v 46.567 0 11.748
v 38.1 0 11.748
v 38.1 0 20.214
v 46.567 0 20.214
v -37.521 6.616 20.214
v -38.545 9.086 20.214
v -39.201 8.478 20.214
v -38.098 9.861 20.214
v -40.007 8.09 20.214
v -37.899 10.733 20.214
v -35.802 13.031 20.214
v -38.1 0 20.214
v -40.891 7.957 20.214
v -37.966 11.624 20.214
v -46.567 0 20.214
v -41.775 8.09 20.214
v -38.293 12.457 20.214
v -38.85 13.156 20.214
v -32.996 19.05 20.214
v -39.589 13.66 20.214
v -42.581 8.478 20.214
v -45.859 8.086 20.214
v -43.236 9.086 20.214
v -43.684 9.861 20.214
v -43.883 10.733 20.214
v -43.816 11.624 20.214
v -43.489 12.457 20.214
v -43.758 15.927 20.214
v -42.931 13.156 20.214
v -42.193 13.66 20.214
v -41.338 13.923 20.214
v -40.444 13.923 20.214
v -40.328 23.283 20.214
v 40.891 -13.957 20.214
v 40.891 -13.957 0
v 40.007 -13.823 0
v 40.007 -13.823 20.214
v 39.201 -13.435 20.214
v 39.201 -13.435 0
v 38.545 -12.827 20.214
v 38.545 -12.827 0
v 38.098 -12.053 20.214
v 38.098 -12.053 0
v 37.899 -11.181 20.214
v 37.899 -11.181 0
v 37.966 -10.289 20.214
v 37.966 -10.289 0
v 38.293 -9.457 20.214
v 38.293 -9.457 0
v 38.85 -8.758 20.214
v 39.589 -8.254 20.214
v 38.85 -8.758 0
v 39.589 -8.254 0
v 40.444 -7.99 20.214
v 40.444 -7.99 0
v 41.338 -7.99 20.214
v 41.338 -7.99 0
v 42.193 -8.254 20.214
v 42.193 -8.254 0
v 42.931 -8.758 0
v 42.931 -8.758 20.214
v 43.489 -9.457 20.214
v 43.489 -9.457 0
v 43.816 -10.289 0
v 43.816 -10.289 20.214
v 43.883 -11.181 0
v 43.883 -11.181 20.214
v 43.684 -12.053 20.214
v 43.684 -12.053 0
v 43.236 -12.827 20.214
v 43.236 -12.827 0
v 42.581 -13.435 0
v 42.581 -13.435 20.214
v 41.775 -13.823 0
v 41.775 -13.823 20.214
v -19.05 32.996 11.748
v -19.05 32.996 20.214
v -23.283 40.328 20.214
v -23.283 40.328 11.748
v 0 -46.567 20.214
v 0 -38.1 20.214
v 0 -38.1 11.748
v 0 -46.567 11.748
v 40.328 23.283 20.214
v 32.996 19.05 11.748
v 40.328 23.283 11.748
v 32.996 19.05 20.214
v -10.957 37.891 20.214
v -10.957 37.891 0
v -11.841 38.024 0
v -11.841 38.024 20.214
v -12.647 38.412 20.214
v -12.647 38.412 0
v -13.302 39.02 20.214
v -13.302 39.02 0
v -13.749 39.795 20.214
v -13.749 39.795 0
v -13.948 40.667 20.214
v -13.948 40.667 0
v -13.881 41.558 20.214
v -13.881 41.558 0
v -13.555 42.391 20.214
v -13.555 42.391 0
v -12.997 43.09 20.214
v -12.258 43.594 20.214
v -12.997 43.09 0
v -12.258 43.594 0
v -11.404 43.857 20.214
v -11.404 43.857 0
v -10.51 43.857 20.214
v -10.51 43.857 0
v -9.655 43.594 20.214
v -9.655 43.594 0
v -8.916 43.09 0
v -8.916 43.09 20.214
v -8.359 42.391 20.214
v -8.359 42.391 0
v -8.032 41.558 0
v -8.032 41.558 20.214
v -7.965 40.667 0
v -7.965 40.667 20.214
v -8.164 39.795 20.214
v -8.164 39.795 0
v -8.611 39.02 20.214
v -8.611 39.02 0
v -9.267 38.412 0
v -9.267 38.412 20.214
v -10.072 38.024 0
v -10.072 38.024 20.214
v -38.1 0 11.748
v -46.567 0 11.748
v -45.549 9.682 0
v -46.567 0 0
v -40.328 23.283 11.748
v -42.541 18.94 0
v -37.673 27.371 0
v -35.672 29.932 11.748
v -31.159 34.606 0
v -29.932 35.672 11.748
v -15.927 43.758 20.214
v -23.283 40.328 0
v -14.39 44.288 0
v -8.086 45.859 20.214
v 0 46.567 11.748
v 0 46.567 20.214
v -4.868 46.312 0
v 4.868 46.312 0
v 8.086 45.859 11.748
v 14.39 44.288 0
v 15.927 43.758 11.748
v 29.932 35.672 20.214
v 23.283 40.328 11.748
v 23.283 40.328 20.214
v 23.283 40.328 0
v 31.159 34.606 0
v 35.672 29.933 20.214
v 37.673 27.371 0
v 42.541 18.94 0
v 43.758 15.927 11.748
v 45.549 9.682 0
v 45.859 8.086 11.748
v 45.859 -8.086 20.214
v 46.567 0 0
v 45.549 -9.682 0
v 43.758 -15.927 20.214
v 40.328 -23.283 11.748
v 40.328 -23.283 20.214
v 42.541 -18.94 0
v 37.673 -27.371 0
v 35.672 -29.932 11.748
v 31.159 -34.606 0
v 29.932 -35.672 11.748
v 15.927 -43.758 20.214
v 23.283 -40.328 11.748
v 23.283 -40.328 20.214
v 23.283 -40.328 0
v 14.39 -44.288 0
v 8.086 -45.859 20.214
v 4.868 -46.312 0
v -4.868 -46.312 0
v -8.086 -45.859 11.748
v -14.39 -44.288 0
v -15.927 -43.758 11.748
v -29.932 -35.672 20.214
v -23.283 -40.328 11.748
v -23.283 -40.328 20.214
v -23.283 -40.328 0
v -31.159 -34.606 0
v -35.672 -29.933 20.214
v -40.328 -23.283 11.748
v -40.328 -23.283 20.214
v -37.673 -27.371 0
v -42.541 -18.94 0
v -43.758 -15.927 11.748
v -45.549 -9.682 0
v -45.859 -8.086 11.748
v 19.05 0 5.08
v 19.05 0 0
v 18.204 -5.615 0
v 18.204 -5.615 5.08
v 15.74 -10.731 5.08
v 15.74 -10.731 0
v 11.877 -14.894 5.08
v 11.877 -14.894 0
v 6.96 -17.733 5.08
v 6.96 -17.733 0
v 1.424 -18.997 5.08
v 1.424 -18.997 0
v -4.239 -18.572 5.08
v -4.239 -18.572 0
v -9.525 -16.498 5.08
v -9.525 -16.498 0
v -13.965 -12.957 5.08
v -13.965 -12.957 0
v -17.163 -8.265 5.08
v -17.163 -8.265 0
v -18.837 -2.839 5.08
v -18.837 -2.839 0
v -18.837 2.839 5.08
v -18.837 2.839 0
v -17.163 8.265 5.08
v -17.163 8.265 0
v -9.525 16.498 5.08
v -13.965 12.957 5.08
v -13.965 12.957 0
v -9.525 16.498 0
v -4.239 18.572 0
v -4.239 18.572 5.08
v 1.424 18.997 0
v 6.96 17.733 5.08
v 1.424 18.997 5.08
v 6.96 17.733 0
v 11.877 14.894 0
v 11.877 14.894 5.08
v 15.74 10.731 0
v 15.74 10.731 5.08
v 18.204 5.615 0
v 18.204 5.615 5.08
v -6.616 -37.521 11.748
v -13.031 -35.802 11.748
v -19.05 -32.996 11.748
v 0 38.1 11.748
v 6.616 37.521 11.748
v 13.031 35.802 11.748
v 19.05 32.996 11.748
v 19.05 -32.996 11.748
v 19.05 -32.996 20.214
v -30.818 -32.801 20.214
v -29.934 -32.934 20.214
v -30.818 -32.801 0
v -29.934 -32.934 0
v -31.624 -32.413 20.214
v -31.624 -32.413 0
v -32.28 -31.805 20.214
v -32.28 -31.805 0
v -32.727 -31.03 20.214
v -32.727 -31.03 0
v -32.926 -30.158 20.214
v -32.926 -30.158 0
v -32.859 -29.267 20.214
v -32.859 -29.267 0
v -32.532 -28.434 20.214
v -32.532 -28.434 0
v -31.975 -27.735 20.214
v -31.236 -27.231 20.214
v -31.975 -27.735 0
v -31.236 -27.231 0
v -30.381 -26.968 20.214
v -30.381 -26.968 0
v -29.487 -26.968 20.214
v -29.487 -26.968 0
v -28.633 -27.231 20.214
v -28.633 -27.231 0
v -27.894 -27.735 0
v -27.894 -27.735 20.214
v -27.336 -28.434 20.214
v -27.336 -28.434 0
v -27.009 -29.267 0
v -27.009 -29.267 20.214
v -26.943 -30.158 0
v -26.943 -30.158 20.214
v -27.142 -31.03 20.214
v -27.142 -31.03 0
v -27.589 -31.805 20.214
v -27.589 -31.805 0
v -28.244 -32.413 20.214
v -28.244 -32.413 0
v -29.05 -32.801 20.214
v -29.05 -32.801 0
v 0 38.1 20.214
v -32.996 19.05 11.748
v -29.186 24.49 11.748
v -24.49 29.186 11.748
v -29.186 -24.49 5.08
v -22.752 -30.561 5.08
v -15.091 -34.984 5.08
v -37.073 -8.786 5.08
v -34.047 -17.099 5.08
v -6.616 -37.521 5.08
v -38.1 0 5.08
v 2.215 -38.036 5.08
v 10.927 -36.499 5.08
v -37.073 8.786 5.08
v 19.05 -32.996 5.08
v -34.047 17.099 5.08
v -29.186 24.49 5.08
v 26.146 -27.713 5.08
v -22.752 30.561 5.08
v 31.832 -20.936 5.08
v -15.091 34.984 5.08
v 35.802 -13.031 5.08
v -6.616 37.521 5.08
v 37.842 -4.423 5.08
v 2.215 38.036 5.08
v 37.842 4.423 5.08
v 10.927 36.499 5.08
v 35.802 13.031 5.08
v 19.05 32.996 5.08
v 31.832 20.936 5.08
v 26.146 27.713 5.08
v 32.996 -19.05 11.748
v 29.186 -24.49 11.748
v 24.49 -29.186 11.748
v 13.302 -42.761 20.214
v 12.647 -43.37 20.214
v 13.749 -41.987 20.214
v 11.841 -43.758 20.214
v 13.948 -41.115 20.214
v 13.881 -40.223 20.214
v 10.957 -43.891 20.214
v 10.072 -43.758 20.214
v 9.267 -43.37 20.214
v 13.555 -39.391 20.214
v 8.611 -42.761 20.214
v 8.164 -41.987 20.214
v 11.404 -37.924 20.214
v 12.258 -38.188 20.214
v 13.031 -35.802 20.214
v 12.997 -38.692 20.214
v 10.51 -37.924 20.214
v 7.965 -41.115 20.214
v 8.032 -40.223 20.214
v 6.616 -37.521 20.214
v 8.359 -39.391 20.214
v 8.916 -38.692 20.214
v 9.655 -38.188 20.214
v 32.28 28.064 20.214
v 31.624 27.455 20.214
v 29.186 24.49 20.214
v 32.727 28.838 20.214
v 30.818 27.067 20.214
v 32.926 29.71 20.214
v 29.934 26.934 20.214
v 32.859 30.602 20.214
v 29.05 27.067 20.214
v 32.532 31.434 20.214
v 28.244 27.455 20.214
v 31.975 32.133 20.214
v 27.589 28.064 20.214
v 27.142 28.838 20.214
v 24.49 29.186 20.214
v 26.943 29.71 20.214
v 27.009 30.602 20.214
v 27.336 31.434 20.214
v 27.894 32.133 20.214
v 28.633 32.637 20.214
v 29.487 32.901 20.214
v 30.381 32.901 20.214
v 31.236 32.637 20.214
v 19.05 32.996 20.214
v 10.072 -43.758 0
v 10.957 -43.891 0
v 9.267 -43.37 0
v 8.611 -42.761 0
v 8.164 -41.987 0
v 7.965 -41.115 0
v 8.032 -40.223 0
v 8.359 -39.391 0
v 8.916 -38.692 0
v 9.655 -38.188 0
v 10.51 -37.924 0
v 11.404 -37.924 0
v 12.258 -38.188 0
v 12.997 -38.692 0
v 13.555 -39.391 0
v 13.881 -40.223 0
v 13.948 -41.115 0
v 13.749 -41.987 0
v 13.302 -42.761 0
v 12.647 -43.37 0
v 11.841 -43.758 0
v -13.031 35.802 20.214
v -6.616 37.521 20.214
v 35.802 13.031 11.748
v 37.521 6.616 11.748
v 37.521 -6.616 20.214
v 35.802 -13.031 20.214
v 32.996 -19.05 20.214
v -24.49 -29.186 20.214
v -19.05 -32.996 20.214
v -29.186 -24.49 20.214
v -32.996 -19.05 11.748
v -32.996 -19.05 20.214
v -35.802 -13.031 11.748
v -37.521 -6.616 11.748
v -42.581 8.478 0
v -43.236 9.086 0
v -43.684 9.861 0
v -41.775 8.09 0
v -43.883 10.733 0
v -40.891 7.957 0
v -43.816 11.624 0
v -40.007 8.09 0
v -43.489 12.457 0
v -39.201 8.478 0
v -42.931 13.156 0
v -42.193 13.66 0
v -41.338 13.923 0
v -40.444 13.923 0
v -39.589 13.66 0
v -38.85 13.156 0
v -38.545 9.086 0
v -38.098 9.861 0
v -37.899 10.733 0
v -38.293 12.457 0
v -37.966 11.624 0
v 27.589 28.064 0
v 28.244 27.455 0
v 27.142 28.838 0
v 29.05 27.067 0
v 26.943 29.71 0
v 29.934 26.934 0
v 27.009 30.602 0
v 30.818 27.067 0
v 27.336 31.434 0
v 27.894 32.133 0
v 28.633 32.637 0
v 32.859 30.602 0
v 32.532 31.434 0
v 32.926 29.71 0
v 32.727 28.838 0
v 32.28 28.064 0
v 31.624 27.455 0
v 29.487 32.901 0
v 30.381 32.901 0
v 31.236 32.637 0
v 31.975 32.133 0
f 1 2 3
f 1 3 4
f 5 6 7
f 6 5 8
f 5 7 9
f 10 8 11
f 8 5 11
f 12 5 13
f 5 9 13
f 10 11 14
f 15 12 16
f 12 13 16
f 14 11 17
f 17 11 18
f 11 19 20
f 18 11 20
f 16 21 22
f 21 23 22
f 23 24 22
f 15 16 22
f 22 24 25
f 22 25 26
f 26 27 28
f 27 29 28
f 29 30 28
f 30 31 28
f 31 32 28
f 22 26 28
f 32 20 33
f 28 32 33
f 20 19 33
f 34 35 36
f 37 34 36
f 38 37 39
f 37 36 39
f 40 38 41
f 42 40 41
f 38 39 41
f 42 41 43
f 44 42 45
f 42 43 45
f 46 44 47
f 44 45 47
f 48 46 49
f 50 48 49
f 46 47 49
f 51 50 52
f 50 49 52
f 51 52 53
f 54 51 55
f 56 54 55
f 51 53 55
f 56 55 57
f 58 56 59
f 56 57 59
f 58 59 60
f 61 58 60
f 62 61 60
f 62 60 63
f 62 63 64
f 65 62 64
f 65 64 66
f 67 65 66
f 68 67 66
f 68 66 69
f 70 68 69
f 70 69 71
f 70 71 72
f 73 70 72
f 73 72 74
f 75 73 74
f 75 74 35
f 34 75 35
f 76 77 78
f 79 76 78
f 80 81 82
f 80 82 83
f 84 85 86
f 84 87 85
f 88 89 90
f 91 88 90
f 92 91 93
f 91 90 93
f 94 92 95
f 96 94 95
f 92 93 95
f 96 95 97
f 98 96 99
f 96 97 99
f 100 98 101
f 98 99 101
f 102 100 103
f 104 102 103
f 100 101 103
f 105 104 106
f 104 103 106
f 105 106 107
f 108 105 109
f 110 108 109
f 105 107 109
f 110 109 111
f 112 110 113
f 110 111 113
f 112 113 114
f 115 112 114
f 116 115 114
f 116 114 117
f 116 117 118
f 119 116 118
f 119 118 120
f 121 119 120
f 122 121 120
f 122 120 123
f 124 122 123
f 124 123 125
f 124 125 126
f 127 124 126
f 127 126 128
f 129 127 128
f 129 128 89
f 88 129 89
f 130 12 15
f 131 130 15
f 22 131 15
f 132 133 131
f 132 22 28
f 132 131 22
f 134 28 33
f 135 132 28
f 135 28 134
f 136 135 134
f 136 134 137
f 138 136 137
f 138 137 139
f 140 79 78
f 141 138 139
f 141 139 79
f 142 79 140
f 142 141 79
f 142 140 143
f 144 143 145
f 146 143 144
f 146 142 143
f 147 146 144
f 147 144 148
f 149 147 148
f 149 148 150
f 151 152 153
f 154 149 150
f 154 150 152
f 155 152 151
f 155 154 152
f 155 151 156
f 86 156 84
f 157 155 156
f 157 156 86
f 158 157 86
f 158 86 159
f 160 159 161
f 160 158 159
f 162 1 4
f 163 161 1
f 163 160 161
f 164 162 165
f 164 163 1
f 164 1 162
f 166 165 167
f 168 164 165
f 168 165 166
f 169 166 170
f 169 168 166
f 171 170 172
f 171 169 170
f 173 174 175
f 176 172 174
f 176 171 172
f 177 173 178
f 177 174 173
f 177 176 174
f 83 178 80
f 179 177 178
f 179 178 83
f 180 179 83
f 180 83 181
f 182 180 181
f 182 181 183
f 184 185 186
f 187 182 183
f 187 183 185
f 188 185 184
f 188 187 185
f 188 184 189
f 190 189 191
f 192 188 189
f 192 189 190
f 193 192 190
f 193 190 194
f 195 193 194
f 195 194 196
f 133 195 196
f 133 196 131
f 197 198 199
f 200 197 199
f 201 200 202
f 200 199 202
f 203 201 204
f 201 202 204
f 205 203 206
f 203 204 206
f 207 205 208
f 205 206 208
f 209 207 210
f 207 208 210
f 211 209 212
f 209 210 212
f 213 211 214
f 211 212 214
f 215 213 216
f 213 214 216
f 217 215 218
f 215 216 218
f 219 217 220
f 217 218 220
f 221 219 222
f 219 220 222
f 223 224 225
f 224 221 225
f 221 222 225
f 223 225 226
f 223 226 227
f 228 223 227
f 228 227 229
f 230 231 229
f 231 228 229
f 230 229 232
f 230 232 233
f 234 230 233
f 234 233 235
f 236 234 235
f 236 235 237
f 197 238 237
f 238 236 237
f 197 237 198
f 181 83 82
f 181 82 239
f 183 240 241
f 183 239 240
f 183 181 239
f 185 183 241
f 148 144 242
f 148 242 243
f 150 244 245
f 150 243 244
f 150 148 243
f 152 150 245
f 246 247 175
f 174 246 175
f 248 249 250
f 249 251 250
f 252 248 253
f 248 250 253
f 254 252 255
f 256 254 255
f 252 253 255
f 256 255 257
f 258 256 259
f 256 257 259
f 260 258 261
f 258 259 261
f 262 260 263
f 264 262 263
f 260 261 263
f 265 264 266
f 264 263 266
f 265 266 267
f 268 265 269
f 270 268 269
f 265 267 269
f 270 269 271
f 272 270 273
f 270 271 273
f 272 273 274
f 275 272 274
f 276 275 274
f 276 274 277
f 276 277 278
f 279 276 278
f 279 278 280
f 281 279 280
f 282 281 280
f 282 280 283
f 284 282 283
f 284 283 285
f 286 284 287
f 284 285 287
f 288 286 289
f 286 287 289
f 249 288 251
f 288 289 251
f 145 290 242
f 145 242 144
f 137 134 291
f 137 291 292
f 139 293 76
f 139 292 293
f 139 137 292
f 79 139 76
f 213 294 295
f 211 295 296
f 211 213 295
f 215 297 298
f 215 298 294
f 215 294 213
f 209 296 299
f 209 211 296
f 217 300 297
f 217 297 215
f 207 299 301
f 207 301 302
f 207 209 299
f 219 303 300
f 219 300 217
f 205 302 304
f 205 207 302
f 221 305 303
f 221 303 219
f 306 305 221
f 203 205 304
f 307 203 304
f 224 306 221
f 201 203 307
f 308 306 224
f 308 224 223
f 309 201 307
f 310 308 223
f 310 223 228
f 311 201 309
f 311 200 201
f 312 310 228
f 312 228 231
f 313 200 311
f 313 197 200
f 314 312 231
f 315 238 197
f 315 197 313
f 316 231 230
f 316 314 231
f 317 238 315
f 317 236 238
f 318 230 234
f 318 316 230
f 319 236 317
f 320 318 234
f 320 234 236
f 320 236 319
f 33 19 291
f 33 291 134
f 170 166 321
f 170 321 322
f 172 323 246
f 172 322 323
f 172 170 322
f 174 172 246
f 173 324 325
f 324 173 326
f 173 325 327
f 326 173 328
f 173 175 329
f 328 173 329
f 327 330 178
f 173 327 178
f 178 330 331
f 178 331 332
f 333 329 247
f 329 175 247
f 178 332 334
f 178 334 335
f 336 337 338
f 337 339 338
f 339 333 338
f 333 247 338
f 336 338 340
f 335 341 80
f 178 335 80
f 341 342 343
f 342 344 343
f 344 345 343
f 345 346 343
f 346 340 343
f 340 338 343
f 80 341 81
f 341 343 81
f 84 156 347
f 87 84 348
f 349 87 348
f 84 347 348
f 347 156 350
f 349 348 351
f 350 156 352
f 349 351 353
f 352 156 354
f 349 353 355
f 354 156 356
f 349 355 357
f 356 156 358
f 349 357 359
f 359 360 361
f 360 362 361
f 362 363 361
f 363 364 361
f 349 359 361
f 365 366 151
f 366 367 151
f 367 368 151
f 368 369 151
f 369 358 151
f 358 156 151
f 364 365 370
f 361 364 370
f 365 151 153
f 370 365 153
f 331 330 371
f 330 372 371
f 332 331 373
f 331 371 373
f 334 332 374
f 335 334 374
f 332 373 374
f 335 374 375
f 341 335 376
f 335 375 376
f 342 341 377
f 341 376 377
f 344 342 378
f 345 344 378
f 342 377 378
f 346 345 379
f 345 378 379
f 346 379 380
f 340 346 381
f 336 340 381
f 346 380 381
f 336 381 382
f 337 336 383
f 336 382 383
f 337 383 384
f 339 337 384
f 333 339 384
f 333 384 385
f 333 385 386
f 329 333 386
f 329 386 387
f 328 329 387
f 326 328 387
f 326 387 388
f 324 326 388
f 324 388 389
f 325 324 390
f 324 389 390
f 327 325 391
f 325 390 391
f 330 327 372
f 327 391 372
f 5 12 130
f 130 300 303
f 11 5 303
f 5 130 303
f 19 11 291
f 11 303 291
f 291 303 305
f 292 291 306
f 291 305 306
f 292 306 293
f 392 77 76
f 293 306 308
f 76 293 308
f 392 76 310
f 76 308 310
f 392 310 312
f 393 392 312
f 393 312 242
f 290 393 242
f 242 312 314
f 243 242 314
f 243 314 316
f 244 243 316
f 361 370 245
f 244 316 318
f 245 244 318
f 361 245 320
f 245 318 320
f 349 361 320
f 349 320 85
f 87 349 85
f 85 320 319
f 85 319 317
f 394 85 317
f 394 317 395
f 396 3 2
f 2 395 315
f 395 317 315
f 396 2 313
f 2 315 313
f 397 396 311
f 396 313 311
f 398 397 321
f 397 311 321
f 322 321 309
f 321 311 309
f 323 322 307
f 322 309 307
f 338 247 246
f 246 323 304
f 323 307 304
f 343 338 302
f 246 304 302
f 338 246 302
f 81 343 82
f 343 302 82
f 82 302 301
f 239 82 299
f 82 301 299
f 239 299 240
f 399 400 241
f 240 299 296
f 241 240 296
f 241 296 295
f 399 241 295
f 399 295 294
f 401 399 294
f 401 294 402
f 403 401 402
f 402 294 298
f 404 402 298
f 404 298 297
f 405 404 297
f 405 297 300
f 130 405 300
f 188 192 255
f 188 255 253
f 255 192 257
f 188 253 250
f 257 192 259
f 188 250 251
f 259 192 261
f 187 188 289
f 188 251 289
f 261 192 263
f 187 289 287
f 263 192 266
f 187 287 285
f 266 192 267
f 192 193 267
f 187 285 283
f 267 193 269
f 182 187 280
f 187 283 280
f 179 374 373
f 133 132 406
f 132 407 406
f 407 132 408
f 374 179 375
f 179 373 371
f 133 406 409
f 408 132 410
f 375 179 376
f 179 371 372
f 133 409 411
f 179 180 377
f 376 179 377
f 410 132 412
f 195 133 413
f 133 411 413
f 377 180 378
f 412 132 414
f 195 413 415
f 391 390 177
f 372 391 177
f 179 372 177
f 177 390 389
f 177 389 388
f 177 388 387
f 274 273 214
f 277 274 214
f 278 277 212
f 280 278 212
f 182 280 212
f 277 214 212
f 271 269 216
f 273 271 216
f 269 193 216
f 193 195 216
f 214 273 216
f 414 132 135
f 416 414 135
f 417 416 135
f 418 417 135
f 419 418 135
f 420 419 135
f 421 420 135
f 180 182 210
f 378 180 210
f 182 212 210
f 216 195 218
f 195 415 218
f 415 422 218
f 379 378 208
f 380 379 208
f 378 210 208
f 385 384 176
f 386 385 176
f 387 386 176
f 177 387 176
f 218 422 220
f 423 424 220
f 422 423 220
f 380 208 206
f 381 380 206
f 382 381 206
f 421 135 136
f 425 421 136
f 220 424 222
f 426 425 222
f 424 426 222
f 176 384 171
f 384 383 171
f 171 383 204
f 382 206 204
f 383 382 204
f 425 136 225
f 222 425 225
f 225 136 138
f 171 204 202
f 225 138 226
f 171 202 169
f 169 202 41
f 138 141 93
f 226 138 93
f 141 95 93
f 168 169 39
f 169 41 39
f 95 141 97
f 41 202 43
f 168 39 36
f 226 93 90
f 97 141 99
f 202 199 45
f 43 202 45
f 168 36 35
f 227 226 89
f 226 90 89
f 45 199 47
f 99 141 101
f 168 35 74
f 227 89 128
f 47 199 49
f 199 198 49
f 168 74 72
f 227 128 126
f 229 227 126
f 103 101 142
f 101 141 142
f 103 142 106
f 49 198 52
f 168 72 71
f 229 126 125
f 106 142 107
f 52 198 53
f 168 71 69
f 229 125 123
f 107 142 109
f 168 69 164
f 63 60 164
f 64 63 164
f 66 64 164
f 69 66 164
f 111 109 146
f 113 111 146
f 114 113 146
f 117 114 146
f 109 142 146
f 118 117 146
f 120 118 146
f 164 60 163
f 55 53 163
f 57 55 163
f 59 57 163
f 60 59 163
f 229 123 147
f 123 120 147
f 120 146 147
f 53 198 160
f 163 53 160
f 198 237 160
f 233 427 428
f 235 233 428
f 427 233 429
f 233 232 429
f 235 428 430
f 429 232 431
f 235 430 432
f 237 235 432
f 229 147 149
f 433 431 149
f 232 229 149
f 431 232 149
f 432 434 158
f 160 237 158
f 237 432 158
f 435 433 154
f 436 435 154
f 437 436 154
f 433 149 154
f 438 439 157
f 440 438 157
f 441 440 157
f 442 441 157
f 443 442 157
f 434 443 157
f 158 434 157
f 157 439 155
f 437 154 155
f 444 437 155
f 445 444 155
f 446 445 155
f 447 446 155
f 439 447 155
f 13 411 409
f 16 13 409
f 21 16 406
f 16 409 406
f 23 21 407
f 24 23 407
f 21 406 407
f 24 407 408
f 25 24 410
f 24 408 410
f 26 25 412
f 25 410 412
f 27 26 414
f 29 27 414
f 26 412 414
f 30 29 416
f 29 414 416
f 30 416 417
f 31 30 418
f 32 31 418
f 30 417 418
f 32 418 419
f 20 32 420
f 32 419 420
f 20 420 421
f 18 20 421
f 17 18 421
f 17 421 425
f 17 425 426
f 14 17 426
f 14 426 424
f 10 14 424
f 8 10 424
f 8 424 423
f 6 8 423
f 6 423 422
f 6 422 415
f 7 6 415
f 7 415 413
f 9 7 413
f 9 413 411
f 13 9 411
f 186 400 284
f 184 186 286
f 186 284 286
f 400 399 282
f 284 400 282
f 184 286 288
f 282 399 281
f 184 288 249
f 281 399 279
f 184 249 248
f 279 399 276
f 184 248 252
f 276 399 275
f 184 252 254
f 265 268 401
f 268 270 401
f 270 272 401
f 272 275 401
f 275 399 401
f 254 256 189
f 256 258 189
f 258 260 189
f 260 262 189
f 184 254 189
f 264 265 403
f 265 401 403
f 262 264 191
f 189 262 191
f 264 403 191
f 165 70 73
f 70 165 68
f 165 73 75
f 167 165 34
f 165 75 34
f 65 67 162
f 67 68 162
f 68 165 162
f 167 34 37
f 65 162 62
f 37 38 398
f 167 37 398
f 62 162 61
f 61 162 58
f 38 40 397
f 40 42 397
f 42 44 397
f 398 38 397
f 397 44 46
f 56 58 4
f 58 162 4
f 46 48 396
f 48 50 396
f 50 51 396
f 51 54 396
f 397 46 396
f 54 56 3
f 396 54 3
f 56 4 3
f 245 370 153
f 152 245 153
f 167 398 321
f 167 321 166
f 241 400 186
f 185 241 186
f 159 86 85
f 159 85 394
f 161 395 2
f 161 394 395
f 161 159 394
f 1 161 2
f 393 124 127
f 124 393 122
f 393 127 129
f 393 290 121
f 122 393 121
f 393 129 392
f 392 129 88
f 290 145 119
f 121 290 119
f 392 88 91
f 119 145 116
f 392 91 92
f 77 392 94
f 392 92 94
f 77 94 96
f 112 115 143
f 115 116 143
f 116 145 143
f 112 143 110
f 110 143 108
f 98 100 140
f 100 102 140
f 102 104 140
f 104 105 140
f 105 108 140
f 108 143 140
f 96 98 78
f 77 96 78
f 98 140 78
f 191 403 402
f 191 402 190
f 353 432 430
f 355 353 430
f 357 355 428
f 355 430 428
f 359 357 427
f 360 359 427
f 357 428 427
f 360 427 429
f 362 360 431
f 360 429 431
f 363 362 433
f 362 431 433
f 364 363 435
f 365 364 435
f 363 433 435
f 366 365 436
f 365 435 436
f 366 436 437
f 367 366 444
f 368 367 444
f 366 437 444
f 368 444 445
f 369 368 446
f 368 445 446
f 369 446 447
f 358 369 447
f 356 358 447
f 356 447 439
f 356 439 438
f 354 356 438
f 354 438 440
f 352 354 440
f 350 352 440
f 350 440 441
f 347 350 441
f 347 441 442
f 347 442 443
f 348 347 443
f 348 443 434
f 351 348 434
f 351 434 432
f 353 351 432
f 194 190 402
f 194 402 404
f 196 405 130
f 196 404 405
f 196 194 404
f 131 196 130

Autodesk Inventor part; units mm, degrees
ref_plane "YZ Plane" through (0, 0, 0) normal (1, 0, 0) x (0, 1, 0)
ref_plane "XZ Plane" through (0, 0, 0) normal (0, 1, 0) x (-1, 0, 0)
ref_plane "XY Plane" through (0, 0, 0) normal (0, 0, 1) x (1, 0, 0)
sketch "Sketch1" plane through (0, 0, 0) normal (0, 0, 1) x (1, 0, 0)
  circle A0 centre (0, 0) radius 38.1
  circle A1 centre (0, 0) radius 19.05
  dimension "d0" = 76.2
  dimension "d1" = 38.1
extrude "Extrusion1" add sketch "Sketch1" along normal blind 5.08
sketch "Sketch2" plane through (0, 0, 0) normal (0, 0, -1) x (-1, 0, 0)
  circle A0 centre (0, 0) radius 46.5667
  circle A1 centre (0, 0) radius 38.1 projected
  dimension "d8" = 8.4667
extrude "Extrusion2" add sketch "Sketch2" against normal blind 20.2142
sketch "Sketch3" plane through (0, 0, 20.2142) normal (0, 0, 1) x (1, 0, 0)
  circle A0 centre (0, 0) radius 46.5667 construction
  arc A1 (23.2833, 40.3279) -> (0, 46.5667) centre (0, 0) ccw
  line L0 (0, 0) -> (23.2833, 40.3279) construction
  line L1 (0, 0) -> (0, 46.5667) construction
  circle A2 centre (0, 0) radius 38.1 projected
  circle A3 centre (0, 0) radius 46.5667 projected
  circle A4 centre (0, 0) radius 38.1 projected
  line L2 (0, 38.1) -> (0, 46.5667)
  line L3 (19.05, 32.9956) -> (23.2833, 40.3279)
  arc A5 (19.05, 32.9956) -> (0, 38.1) centre (0, 0) ccw
  dimension "d9" = 30
extrude "Extrusion3" cut sketch "Sketch3" against normal blind 8.4667 contours L3 A2 L2 A1
pattern_circular "Circular Pattern1" count 6 over 360 about axis through (0, 0, 0) along (0, 0, 1) of "Extrusion3"
sketch "Sketch4" plane through (0, 0, 20.2142) normal (0, 0, 1) x (1, 0, 0)
  line L0 (-40.8909, 10.9567) -> (-10.9567, 40.8909)
  line L1 (-10.9567, 40.8909) -> (29.9342, 29.9342)
  line L2 (29.9342, 29.9342) -> (40.8909, -10.9567)
  line L3 (40.8909, -10.9567) -> (10.9567, -40.8909)
  line L4 (10.9567, -40.8909) -> (-29.9342, -29.9342)
  line L5 (-29.9342, -29.9342) -> (-40.8909, 10.9567)
  line L6 (-23.2833, 40.3279) -> (-19.05, 32.9956) projected
  arc A0 (0, 38.1) -> (-19.05, 32.9956) centre (0, 0) ccw projected
  line L7 (0, 38.1) -> (0, 46.5667) projected
  arc A1 (0, 46.5667) -> (-23.2833, 40.3279) centre (0, 0) ccw projected
  arc A2 (0, 38.1) -> (-19.05, 32.9956) centre (0, 0) ccw projected
  line L8 (-9.861, 36.8018) -> (-12.0523, 44.9799)
  arc A3 (0, 46.5667) -> (-23.2833, 40.3279) centre (0, 0) ccw projected
hole "Hole1" at (-10.9567, 40.8909, 20.2142) at (29.9342, 29.9342, 20.2142) at (-40.8909, 10.9567, 20.2142) at (-29.9342, -29.9342, 20.2142) at (10.9567, -40.8909, 20.2142) at (40.8909, -10.9567, 20.2142) direction (0, 0, -1) diameter 6 end through all
properties part number "Stator"
